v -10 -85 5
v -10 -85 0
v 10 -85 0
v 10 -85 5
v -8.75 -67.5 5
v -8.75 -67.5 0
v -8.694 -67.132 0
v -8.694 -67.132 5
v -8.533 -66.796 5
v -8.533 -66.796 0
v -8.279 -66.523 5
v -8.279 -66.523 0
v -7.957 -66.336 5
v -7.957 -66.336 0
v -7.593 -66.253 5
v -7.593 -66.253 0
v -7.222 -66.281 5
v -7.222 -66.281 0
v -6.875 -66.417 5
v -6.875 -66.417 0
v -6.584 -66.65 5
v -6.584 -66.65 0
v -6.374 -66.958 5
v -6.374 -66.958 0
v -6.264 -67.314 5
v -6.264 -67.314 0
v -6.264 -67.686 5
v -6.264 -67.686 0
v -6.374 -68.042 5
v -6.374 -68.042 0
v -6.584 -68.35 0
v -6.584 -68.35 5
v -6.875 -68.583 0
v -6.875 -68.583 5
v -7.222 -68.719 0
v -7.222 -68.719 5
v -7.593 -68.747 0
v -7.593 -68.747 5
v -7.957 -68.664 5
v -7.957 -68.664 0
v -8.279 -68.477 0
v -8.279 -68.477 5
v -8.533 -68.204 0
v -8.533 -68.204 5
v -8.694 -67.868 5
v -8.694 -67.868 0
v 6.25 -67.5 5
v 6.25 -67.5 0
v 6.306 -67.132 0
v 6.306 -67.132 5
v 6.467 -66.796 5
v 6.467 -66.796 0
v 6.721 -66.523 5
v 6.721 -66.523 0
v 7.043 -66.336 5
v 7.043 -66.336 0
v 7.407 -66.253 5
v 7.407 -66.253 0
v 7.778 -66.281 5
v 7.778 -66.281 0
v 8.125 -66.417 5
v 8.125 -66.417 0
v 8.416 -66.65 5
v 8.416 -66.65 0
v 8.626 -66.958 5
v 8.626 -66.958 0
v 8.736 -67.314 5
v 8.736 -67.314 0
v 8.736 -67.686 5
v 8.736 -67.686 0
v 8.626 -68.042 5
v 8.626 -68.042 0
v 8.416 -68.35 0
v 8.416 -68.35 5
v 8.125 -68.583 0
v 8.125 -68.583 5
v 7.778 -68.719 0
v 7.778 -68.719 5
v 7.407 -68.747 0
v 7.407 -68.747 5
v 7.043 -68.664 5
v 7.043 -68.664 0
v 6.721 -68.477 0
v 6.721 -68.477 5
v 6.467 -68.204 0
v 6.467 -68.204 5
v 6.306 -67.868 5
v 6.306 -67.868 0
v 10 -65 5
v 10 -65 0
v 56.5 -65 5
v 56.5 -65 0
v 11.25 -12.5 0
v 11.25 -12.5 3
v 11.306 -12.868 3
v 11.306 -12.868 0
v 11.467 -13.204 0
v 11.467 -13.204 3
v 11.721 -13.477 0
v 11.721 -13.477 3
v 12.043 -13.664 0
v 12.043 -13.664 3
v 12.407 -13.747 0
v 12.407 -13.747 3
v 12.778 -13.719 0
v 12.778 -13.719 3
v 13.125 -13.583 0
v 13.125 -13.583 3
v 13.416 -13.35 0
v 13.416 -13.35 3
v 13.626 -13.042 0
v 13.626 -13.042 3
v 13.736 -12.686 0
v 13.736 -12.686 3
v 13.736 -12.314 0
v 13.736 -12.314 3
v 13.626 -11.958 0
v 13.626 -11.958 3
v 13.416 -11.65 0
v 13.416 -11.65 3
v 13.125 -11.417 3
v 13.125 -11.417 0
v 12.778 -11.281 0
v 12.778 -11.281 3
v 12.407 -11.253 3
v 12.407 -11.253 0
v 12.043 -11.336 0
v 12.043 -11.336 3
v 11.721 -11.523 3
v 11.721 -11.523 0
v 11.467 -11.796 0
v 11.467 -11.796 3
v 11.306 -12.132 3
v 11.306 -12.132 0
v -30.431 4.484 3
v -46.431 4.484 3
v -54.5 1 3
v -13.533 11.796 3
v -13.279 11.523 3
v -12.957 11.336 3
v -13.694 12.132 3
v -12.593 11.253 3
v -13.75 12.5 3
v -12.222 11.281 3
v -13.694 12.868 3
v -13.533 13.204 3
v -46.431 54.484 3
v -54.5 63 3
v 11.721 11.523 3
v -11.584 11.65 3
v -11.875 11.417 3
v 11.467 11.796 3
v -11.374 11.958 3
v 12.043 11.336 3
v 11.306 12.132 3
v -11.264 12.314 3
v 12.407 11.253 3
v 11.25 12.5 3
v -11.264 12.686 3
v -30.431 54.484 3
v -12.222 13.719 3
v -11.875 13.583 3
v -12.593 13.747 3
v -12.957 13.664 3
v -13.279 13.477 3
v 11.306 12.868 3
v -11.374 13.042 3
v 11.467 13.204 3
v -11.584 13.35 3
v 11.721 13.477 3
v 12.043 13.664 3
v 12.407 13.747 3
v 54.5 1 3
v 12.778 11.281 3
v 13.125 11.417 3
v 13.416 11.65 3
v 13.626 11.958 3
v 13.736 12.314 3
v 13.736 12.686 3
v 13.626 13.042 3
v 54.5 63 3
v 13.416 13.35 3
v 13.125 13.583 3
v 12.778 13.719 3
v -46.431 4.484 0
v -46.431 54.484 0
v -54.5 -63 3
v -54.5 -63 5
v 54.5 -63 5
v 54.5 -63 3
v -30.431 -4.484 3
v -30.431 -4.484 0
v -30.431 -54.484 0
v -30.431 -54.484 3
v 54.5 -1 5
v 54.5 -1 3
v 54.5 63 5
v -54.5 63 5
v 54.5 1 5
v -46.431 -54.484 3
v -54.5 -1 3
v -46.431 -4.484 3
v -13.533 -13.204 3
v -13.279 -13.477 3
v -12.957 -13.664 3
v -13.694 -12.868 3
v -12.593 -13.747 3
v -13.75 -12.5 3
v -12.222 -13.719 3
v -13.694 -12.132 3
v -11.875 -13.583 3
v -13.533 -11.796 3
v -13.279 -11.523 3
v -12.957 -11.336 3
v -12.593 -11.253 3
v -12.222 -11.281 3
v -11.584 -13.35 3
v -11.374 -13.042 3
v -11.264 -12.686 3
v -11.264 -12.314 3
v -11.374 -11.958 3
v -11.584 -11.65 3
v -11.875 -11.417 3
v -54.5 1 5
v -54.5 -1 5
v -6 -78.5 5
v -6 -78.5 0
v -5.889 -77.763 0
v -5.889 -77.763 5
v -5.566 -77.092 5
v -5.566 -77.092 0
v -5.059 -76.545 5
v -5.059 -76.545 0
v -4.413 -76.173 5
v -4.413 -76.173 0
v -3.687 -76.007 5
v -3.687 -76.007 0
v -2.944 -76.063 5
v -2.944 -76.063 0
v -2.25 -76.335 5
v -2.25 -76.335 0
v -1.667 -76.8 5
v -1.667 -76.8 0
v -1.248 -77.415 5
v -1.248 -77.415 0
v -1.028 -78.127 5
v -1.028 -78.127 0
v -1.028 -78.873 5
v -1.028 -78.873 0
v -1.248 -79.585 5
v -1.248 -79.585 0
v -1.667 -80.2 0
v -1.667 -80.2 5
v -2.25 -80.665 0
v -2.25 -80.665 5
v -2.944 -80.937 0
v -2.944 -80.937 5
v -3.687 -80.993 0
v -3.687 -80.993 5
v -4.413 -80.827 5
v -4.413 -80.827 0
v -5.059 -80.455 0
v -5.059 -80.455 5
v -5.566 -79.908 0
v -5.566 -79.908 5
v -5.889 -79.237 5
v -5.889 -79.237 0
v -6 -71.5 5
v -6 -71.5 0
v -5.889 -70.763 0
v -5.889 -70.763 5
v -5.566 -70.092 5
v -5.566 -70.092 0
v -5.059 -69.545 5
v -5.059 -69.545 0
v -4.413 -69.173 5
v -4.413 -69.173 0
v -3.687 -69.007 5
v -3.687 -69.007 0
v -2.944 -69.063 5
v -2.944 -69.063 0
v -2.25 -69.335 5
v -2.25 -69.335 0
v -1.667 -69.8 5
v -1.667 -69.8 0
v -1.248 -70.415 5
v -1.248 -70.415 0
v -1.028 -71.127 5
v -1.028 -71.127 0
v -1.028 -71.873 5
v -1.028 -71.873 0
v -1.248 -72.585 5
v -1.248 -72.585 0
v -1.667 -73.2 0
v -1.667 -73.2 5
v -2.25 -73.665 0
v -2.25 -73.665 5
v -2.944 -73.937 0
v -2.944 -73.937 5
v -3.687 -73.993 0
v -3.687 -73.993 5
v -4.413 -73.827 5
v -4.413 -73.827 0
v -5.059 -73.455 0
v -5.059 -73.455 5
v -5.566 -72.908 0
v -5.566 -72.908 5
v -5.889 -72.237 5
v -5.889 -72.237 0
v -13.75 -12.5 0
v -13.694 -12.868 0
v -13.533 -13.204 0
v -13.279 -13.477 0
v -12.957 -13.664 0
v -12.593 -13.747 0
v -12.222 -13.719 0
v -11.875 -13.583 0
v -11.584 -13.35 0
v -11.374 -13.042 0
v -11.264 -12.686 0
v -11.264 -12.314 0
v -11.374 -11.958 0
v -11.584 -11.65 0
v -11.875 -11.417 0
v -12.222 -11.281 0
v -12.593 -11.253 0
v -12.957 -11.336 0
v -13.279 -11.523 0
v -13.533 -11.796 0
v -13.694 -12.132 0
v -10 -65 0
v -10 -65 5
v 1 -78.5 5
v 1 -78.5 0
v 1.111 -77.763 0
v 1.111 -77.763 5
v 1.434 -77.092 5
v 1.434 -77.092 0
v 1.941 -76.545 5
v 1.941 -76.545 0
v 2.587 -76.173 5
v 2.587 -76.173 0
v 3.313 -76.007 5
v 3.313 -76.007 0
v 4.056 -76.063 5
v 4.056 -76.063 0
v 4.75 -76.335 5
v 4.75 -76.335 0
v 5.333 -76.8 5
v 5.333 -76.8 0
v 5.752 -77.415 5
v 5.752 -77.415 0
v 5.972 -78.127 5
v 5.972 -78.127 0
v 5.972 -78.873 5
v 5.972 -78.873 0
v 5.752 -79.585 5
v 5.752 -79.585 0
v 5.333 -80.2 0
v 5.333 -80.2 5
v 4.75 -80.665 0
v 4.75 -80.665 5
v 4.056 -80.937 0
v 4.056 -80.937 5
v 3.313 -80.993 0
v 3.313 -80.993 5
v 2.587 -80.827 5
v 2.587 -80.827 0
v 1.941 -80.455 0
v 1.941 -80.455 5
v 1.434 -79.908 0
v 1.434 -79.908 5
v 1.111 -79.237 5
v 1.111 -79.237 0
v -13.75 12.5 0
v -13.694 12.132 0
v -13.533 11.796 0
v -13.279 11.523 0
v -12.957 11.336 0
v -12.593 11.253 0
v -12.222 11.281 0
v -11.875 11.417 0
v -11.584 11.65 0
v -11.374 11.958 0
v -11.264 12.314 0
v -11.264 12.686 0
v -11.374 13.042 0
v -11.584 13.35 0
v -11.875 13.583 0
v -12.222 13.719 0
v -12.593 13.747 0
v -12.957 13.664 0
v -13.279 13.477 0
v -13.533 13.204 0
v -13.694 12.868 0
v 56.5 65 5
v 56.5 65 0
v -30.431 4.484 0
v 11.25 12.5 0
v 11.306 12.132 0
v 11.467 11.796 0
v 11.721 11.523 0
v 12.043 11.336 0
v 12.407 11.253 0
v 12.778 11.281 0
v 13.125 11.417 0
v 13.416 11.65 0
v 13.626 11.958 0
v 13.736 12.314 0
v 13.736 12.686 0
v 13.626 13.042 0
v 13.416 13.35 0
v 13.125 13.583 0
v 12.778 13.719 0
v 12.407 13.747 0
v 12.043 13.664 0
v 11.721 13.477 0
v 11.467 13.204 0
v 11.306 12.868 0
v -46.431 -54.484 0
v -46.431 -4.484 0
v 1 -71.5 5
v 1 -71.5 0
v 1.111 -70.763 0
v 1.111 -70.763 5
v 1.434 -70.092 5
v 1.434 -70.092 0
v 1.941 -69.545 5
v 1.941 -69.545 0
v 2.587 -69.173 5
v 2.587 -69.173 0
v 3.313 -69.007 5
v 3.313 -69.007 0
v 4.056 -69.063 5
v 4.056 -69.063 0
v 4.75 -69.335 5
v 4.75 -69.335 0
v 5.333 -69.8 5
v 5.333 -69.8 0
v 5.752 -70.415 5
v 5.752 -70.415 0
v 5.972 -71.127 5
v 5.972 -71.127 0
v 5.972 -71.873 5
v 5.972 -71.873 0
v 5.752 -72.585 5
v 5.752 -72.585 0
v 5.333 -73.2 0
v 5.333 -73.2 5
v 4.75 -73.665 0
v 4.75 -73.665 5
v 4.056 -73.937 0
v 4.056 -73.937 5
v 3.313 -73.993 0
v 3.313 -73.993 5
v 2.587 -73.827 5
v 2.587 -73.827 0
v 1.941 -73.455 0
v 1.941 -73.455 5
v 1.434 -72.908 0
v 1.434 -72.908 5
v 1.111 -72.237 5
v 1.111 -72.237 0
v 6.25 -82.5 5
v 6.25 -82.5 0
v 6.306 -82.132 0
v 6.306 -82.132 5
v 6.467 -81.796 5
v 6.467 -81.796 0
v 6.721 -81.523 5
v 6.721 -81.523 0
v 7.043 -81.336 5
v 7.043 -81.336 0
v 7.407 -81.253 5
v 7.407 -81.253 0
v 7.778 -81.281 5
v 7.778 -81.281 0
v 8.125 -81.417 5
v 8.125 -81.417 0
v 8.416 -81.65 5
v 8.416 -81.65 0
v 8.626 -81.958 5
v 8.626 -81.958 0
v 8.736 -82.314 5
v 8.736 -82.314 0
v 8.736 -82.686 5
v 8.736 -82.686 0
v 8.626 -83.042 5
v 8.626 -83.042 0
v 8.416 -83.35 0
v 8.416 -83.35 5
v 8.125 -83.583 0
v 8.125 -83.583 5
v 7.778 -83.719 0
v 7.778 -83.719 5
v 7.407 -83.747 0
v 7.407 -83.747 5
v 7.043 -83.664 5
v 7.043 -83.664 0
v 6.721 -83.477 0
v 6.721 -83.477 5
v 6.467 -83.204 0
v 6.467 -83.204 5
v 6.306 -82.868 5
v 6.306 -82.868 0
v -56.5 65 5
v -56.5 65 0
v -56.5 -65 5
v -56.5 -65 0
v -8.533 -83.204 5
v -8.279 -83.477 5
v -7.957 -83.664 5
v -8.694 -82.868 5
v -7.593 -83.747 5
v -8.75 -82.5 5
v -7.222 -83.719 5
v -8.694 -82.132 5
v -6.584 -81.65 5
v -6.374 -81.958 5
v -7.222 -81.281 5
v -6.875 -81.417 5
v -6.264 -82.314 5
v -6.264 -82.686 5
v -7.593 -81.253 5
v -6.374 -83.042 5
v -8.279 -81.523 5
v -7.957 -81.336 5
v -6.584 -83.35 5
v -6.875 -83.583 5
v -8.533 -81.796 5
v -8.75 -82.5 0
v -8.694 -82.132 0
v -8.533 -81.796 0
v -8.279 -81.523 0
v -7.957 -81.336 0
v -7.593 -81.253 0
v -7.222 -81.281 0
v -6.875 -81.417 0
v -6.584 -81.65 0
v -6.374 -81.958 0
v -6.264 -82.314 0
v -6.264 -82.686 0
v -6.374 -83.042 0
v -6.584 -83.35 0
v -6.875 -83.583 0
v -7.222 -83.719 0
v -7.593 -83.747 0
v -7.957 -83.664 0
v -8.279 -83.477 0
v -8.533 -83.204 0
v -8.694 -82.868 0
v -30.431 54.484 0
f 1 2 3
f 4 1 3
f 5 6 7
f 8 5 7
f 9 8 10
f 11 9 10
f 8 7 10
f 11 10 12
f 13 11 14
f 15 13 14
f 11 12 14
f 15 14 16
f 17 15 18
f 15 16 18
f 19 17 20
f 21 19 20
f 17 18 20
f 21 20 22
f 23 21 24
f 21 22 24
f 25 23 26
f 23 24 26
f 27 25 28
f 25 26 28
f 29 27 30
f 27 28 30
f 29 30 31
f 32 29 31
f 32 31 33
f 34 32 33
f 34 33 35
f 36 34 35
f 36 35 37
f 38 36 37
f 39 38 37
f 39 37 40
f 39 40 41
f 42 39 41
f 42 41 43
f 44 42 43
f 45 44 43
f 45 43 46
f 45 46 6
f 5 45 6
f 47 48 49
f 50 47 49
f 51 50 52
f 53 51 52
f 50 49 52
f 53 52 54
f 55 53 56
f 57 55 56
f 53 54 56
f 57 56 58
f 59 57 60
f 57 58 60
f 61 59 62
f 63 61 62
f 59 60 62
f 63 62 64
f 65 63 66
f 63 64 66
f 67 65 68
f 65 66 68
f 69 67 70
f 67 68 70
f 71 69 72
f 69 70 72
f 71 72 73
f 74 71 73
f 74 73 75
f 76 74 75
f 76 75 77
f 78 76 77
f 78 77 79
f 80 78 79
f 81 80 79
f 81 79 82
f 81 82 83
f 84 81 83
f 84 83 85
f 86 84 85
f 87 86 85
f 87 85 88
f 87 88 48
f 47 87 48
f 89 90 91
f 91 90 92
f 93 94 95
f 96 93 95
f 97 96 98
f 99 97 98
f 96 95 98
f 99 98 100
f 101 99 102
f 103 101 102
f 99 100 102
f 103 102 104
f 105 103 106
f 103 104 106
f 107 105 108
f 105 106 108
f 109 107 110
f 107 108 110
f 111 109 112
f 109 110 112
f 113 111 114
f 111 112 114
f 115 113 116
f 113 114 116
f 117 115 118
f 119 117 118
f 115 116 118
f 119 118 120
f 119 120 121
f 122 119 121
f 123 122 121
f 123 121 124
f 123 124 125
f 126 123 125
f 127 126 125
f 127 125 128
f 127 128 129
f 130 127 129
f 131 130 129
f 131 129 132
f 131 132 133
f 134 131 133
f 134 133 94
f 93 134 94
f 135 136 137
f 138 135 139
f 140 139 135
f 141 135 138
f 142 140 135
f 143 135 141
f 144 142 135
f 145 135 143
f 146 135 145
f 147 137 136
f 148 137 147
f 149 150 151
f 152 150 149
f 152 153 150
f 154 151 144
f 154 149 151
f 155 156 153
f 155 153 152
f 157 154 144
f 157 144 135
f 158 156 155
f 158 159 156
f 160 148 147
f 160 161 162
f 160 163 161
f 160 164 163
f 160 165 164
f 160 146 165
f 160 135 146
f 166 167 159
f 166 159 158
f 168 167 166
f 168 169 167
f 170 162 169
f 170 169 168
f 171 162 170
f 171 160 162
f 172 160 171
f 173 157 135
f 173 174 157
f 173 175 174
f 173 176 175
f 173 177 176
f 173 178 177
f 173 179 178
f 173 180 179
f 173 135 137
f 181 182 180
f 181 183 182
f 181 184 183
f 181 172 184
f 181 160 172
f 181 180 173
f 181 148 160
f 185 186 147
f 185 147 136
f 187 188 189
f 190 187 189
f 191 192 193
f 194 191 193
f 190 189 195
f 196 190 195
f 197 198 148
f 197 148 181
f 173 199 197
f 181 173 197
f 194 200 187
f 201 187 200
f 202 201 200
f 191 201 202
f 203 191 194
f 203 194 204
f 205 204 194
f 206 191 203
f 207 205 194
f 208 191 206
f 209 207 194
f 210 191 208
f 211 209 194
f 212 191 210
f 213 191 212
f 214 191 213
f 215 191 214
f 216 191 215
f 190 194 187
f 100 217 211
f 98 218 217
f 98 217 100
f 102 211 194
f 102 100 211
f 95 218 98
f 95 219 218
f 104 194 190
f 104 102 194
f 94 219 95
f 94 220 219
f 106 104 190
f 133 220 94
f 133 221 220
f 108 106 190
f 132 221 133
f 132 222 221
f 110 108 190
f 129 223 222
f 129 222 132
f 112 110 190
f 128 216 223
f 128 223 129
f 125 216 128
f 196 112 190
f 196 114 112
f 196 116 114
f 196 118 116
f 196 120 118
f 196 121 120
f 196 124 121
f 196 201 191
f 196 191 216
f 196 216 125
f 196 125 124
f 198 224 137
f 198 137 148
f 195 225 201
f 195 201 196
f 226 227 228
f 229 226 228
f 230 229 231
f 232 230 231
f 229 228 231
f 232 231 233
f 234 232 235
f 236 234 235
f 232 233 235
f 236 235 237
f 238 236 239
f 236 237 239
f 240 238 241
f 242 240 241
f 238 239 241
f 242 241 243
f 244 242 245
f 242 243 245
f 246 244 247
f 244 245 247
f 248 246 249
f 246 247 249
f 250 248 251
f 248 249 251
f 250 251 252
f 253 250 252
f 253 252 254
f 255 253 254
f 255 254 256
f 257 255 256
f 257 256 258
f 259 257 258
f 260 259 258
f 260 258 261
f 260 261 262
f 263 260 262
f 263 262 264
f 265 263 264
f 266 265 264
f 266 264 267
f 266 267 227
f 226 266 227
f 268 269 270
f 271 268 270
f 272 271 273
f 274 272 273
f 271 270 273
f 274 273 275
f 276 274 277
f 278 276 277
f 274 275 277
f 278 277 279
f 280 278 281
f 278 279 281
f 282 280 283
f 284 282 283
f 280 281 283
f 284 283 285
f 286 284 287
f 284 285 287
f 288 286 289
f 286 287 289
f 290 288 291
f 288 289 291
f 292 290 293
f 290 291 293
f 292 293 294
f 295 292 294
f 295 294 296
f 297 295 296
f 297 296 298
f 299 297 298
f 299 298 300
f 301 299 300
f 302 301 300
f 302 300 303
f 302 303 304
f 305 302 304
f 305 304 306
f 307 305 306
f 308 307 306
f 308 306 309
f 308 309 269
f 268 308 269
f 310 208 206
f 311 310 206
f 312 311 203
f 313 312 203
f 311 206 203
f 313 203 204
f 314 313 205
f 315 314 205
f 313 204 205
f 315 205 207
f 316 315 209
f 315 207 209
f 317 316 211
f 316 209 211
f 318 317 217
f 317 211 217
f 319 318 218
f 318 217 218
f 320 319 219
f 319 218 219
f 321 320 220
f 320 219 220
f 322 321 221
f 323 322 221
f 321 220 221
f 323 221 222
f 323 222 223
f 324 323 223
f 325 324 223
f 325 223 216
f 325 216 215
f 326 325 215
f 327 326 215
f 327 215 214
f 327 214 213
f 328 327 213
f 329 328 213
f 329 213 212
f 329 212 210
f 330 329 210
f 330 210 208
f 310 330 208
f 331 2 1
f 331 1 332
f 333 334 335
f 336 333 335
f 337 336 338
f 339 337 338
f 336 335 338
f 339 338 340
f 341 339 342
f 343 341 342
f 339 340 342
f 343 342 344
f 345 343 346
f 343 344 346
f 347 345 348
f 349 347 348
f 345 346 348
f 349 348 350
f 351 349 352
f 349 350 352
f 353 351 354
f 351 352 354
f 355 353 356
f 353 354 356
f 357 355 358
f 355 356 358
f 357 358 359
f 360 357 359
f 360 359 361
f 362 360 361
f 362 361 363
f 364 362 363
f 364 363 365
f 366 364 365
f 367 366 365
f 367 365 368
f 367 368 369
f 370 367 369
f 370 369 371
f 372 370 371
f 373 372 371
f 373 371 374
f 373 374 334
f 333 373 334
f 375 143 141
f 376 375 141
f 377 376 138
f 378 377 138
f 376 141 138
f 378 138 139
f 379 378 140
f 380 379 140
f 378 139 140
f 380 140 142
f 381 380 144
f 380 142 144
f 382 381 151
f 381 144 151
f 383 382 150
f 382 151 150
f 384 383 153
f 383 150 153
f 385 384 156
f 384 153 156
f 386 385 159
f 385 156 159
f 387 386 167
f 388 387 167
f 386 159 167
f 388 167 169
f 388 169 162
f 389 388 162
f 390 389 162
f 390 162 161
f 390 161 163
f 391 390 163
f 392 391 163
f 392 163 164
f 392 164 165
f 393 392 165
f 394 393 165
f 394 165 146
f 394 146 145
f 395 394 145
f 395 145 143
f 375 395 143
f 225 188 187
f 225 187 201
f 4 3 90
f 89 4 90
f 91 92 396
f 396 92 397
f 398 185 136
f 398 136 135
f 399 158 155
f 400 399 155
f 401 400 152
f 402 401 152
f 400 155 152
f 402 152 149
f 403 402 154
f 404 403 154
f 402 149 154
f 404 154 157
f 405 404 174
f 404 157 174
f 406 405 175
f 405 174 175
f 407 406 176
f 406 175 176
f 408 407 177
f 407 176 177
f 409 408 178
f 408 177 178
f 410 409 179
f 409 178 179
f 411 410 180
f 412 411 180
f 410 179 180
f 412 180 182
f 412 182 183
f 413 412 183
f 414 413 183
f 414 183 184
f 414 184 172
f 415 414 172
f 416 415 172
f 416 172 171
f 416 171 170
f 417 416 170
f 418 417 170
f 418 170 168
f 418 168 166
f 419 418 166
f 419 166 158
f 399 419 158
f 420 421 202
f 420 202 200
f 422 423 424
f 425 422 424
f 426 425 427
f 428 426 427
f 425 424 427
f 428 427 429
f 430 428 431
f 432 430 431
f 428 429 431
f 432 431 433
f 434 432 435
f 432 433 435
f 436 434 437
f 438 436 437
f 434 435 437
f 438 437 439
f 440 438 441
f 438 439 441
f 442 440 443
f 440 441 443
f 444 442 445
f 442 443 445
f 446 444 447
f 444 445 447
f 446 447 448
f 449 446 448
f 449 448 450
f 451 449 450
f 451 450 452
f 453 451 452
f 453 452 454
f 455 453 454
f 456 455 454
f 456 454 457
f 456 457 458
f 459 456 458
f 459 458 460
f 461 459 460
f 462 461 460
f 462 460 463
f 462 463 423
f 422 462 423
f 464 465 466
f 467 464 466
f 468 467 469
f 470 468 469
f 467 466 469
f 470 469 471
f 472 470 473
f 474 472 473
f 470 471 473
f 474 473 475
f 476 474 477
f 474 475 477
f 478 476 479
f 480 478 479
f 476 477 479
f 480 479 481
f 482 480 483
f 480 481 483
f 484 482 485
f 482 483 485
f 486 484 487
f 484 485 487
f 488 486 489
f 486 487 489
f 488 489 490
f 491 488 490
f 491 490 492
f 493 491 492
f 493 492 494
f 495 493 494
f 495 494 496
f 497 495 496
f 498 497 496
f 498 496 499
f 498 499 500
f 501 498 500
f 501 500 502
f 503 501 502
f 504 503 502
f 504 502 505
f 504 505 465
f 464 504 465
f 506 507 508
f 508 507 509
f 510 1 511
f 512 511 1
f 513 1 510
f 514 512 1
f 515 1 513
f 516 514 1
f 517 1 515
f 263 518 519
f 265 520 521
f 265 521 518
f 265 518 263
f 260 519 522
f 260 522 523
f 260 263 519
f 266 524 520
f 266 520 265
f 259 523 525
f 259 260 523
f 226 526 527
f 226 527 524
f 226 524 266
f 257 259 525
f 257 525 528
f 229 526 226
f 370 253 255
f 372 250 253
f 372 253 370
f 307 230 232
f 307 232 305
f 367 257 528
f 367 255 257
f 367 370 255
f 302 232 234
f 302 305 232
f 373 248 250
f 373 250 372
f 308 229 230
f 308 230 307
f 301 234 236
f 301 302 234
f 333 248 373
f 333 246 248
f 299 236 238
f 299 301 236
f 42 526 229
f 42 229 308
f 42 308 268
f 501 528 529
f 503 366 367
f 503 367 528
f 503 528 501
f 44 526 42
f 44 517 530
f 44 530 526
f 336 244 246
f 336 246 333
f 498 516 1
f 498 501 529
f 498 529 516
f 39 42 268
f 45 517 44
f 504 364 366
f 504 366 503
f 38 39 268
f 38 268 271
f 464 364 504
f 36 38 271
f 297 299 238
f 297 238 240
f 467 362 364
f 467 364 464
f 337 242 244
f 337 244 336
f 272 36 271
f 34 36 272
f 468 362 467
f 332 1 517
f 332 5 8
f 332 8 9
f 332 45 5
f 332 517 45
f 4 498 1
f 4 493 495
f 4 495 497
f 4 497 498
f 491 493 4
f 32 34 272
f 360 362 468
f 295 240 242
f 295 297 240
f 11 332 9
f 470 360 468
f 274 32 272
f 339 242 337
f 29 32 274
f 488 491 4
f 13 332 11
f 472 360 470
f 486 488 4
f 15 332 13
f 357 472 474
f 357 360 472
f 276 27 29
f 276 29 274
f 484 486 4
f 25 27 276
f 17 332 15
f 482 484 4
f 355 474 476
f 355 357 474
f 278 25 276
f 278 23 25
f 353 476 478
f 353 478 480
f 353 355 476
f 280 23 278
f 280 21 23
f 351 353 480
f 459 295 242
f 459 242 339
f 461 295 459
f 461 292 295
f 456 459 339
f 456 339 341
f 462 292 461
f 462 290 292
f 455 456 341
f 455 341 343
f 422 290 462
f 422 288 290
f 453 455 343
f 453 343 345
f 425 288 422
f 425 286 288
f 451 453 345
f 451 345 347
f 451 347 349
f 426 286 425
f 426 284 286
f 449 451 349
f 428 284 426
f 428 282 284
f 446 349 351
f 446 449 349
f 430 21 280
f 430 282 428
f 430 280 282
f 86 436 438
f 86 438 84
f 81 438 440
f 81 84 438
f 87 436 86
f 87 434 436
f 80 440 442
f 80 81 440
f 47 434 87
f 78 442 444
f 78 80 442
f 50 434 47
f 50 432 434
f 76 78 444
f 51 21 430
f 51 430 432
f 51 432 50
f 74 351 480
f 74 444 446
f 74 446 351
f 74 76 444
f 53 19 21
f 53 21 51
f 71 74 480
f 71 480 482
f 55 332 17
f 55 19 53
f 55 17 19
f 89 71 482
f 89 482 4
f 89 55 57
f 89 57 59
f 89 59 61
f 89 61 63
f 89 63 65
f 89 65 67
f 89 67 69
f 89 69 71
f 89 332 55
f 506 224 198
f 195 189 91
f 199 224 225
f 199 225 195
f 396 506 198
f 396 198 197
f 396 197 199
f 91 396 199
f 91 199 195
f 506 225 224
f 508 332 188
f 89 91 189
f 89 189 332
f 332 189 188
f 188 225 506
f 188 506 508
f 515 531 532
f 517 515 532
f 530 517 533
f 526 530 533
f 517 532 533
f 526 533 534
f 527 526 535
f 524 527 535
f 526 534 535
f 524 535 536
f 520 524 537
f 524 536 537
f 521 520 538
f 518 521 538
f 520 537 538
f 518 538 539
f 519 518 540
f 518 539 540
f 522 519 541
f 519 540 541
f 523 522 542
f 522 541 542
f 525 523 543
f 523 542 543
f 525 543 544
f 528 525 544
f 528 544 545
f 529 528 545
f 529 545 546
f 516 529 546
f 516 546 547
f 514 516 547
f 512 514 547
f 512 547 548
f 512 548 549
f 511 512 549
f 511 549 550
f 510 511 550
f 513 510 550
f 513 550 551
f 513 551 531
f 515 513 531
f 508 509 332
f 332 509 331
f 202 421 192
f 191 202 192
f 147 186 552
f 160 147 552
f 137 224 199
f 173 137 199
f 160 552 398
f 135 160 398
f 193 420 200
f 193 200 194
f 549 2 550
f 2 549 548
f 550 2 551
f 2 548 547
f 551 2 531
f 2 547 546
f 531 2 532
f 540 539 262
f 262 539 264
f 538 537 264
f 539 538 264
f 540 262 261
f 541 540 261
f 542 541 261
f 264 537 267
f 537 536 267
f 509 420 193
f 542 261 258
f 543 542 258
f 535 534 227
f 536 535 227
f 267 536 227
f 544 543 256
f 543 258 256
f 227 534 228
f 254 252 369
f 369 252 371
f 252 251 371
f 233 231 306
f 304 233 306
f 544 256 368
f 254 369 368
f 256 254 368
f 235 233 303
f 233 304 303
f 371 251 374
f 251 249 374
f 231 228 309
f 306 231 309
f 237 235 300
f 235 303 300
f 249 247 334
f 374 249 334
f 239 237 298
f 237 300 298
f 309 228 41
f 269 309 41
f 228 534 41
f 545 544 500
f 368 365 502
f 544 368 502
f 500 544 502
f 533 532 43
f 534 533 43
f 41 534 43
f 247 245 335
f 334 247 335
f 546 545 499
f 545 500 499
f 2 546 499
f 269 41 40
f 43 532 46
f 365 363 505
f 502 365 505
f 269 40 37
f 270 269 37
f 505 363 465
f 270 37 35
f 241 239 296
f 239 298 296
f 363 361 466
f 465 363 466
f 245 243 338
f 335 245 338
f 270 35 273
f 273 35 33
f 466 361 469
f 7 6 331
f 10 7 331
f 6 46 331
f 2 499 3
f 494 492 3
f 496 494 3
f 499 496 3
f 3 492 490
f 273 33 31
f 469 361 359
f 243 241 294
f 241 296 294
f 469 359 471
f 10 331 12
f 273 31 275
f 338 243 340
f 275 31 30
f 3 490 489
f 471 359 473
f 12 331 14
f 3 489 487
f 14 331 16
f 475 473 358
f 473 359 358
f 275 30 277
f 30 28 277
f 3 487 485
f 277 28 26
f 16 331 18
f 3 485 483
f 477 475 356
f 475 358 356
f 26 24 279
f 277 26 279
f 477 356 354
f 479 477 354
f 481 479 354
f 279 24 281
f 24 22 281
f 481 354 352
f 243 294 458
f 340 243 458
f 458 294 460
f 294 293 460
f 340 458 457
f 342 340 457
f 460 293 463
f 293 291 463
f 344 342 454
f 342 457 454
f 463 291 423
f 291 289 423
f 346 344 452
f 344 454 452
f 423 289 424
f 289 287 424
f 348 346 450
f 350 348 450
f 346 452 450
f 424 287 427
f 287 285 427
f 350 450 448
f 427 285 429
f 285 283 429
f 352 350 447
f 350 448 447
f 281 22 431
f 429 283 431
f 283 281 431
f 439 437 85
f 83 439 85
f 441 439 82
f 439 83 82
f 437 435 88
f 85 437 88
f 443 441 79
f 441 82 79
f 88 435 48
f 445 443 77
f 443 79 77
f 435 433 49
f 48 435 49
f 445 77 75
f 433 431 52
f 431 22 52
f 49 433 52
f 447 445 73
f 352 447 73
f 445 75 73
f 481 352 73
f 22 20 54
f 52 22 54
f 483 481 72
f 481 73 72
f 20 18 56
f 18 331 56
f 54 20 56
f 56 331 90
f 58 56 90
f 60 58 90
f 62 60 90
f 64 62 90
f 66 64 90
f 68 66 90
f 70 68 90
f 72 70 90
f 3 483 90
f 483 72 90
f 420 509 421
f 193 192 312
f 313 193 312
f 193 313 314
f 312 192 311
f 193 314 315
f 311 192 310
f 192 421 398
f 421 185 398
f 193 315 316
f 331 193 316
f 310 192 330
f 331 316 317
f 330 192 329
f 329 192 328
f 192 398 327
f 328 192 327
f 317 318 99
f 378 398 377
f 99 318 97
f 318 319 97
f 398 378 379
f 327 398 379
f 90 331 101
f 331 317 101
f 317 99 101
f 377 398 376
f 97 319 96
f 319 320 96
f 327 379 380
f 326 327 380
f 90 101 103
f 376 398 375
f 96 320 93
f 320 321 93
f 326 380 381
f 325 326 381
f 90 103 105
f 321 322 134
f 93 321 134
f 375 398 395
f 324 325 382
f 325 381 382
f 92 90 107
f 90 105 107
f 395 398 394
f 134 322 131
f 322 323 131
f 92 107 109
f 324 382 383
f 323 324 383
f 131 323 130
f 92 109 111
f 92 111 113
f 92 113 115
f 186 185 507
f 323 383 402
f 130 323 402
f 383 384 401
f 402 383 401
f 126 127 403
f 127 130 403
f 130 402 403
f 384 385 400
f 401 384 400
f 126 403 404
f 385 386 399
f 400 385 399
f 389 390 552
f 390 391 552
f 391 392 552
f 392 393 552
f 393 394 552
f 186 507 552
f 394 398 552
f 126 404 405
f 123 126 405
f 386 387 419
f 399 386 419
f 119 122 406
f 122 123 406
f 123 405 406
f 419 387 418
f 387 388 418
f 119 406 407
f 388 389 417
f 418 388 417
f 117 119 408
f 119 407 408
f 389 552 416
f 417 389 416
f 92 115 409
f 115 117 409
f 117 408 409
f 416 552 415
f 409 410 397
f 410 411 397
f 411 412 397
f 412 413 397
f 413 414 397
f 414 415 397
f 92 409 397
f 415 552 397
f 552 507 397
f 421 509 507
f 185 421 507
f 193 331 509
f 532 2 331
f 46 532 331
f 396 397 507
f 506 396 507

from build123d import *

# Parameters (mm, degrees)
F0_W      = 20
F0_H      = 20
F1_DEPTH  = 5
F3_D      = 2.5
F4_D      = 5
F5_W      = 109
F5_H      = 62
F6_DEPTH  = 2
F8_D      = 2.5
F9_W      = 16
F9_H      = 50
F10_DEPTH = 5.001


with BuildPart() as f1:
    # F0 (on Top) → F1 (new body)
    with BuildSketch(Plane.XY):
        Polygon((56.5, -65), (56.5, 65), (-56.5, 65), (-56.5, -65), (-10, -65), (-10, -45), (10, -45), (10, -65), align=None)
        with Locations((0, -75)):
            Rectangle(F0_W, F0_H)
        with Locations((0, -55)):
            Rectangle(F0_W, F0_H)
    extrude(amount=F1_DEPTH)

    # F3 (through all)
    with Locations(Plane.XY.offset(5)):
        with Locations((-7.5, -82.5), (-7.5, -67.5), (7.5, -67.5), (7.5, -82.5)):
            Hole(F3_D / 2)

    # F4 (through all)
    with Locations(Plane.XY.offset(5)):
        with Locations((-3.5, -71.5), (3.5, -71.5), (3.5, -78.5), (-3.5, -78.5)):
            Hole(F4_D / 2)

    # F5 (on face) → F6 (cut)
    with BuildSketch(Plane.XY.offset(5)):
        with Locations((0, 32)):
            Rectangle(F5_W, F5_H)
        with Locations((0, -32)):
            Rectangle(F5_W, F5_H)
    extrude(amount=-F6_DEPTH, mode=Mode.SUBTRACT)

    # F8 (through all)
    with Locations(Plane(origin=(0, 0, 0), x_dir=(1, 0, 0), z_dir=(0, 0, -1))):
        with Locations((-12.5, 12.5), (12.5, 12.5), (12.5, -12.5), (-12.5, -12.5)):
            Hole(F8_D / 2)

    # F9 (on face) → F10 (cut, through all)
    with BuildSketch(Plane(origin=(0, 0, 0), x_dir=(1, 0, 0), z_dir=(0, 0, -1))):
        with Locations((-38.4313402772, 29.4842413627)):
            Rectangle(F9_W, F9_H)
        with Locations((-38.4313402772, -29.4842413627)):
            Rectangle(F9_W, F9_H)
    extrude(amount=-F10_DEPTH, mode=Mode.SUBTRACT)


solid = f1.part
